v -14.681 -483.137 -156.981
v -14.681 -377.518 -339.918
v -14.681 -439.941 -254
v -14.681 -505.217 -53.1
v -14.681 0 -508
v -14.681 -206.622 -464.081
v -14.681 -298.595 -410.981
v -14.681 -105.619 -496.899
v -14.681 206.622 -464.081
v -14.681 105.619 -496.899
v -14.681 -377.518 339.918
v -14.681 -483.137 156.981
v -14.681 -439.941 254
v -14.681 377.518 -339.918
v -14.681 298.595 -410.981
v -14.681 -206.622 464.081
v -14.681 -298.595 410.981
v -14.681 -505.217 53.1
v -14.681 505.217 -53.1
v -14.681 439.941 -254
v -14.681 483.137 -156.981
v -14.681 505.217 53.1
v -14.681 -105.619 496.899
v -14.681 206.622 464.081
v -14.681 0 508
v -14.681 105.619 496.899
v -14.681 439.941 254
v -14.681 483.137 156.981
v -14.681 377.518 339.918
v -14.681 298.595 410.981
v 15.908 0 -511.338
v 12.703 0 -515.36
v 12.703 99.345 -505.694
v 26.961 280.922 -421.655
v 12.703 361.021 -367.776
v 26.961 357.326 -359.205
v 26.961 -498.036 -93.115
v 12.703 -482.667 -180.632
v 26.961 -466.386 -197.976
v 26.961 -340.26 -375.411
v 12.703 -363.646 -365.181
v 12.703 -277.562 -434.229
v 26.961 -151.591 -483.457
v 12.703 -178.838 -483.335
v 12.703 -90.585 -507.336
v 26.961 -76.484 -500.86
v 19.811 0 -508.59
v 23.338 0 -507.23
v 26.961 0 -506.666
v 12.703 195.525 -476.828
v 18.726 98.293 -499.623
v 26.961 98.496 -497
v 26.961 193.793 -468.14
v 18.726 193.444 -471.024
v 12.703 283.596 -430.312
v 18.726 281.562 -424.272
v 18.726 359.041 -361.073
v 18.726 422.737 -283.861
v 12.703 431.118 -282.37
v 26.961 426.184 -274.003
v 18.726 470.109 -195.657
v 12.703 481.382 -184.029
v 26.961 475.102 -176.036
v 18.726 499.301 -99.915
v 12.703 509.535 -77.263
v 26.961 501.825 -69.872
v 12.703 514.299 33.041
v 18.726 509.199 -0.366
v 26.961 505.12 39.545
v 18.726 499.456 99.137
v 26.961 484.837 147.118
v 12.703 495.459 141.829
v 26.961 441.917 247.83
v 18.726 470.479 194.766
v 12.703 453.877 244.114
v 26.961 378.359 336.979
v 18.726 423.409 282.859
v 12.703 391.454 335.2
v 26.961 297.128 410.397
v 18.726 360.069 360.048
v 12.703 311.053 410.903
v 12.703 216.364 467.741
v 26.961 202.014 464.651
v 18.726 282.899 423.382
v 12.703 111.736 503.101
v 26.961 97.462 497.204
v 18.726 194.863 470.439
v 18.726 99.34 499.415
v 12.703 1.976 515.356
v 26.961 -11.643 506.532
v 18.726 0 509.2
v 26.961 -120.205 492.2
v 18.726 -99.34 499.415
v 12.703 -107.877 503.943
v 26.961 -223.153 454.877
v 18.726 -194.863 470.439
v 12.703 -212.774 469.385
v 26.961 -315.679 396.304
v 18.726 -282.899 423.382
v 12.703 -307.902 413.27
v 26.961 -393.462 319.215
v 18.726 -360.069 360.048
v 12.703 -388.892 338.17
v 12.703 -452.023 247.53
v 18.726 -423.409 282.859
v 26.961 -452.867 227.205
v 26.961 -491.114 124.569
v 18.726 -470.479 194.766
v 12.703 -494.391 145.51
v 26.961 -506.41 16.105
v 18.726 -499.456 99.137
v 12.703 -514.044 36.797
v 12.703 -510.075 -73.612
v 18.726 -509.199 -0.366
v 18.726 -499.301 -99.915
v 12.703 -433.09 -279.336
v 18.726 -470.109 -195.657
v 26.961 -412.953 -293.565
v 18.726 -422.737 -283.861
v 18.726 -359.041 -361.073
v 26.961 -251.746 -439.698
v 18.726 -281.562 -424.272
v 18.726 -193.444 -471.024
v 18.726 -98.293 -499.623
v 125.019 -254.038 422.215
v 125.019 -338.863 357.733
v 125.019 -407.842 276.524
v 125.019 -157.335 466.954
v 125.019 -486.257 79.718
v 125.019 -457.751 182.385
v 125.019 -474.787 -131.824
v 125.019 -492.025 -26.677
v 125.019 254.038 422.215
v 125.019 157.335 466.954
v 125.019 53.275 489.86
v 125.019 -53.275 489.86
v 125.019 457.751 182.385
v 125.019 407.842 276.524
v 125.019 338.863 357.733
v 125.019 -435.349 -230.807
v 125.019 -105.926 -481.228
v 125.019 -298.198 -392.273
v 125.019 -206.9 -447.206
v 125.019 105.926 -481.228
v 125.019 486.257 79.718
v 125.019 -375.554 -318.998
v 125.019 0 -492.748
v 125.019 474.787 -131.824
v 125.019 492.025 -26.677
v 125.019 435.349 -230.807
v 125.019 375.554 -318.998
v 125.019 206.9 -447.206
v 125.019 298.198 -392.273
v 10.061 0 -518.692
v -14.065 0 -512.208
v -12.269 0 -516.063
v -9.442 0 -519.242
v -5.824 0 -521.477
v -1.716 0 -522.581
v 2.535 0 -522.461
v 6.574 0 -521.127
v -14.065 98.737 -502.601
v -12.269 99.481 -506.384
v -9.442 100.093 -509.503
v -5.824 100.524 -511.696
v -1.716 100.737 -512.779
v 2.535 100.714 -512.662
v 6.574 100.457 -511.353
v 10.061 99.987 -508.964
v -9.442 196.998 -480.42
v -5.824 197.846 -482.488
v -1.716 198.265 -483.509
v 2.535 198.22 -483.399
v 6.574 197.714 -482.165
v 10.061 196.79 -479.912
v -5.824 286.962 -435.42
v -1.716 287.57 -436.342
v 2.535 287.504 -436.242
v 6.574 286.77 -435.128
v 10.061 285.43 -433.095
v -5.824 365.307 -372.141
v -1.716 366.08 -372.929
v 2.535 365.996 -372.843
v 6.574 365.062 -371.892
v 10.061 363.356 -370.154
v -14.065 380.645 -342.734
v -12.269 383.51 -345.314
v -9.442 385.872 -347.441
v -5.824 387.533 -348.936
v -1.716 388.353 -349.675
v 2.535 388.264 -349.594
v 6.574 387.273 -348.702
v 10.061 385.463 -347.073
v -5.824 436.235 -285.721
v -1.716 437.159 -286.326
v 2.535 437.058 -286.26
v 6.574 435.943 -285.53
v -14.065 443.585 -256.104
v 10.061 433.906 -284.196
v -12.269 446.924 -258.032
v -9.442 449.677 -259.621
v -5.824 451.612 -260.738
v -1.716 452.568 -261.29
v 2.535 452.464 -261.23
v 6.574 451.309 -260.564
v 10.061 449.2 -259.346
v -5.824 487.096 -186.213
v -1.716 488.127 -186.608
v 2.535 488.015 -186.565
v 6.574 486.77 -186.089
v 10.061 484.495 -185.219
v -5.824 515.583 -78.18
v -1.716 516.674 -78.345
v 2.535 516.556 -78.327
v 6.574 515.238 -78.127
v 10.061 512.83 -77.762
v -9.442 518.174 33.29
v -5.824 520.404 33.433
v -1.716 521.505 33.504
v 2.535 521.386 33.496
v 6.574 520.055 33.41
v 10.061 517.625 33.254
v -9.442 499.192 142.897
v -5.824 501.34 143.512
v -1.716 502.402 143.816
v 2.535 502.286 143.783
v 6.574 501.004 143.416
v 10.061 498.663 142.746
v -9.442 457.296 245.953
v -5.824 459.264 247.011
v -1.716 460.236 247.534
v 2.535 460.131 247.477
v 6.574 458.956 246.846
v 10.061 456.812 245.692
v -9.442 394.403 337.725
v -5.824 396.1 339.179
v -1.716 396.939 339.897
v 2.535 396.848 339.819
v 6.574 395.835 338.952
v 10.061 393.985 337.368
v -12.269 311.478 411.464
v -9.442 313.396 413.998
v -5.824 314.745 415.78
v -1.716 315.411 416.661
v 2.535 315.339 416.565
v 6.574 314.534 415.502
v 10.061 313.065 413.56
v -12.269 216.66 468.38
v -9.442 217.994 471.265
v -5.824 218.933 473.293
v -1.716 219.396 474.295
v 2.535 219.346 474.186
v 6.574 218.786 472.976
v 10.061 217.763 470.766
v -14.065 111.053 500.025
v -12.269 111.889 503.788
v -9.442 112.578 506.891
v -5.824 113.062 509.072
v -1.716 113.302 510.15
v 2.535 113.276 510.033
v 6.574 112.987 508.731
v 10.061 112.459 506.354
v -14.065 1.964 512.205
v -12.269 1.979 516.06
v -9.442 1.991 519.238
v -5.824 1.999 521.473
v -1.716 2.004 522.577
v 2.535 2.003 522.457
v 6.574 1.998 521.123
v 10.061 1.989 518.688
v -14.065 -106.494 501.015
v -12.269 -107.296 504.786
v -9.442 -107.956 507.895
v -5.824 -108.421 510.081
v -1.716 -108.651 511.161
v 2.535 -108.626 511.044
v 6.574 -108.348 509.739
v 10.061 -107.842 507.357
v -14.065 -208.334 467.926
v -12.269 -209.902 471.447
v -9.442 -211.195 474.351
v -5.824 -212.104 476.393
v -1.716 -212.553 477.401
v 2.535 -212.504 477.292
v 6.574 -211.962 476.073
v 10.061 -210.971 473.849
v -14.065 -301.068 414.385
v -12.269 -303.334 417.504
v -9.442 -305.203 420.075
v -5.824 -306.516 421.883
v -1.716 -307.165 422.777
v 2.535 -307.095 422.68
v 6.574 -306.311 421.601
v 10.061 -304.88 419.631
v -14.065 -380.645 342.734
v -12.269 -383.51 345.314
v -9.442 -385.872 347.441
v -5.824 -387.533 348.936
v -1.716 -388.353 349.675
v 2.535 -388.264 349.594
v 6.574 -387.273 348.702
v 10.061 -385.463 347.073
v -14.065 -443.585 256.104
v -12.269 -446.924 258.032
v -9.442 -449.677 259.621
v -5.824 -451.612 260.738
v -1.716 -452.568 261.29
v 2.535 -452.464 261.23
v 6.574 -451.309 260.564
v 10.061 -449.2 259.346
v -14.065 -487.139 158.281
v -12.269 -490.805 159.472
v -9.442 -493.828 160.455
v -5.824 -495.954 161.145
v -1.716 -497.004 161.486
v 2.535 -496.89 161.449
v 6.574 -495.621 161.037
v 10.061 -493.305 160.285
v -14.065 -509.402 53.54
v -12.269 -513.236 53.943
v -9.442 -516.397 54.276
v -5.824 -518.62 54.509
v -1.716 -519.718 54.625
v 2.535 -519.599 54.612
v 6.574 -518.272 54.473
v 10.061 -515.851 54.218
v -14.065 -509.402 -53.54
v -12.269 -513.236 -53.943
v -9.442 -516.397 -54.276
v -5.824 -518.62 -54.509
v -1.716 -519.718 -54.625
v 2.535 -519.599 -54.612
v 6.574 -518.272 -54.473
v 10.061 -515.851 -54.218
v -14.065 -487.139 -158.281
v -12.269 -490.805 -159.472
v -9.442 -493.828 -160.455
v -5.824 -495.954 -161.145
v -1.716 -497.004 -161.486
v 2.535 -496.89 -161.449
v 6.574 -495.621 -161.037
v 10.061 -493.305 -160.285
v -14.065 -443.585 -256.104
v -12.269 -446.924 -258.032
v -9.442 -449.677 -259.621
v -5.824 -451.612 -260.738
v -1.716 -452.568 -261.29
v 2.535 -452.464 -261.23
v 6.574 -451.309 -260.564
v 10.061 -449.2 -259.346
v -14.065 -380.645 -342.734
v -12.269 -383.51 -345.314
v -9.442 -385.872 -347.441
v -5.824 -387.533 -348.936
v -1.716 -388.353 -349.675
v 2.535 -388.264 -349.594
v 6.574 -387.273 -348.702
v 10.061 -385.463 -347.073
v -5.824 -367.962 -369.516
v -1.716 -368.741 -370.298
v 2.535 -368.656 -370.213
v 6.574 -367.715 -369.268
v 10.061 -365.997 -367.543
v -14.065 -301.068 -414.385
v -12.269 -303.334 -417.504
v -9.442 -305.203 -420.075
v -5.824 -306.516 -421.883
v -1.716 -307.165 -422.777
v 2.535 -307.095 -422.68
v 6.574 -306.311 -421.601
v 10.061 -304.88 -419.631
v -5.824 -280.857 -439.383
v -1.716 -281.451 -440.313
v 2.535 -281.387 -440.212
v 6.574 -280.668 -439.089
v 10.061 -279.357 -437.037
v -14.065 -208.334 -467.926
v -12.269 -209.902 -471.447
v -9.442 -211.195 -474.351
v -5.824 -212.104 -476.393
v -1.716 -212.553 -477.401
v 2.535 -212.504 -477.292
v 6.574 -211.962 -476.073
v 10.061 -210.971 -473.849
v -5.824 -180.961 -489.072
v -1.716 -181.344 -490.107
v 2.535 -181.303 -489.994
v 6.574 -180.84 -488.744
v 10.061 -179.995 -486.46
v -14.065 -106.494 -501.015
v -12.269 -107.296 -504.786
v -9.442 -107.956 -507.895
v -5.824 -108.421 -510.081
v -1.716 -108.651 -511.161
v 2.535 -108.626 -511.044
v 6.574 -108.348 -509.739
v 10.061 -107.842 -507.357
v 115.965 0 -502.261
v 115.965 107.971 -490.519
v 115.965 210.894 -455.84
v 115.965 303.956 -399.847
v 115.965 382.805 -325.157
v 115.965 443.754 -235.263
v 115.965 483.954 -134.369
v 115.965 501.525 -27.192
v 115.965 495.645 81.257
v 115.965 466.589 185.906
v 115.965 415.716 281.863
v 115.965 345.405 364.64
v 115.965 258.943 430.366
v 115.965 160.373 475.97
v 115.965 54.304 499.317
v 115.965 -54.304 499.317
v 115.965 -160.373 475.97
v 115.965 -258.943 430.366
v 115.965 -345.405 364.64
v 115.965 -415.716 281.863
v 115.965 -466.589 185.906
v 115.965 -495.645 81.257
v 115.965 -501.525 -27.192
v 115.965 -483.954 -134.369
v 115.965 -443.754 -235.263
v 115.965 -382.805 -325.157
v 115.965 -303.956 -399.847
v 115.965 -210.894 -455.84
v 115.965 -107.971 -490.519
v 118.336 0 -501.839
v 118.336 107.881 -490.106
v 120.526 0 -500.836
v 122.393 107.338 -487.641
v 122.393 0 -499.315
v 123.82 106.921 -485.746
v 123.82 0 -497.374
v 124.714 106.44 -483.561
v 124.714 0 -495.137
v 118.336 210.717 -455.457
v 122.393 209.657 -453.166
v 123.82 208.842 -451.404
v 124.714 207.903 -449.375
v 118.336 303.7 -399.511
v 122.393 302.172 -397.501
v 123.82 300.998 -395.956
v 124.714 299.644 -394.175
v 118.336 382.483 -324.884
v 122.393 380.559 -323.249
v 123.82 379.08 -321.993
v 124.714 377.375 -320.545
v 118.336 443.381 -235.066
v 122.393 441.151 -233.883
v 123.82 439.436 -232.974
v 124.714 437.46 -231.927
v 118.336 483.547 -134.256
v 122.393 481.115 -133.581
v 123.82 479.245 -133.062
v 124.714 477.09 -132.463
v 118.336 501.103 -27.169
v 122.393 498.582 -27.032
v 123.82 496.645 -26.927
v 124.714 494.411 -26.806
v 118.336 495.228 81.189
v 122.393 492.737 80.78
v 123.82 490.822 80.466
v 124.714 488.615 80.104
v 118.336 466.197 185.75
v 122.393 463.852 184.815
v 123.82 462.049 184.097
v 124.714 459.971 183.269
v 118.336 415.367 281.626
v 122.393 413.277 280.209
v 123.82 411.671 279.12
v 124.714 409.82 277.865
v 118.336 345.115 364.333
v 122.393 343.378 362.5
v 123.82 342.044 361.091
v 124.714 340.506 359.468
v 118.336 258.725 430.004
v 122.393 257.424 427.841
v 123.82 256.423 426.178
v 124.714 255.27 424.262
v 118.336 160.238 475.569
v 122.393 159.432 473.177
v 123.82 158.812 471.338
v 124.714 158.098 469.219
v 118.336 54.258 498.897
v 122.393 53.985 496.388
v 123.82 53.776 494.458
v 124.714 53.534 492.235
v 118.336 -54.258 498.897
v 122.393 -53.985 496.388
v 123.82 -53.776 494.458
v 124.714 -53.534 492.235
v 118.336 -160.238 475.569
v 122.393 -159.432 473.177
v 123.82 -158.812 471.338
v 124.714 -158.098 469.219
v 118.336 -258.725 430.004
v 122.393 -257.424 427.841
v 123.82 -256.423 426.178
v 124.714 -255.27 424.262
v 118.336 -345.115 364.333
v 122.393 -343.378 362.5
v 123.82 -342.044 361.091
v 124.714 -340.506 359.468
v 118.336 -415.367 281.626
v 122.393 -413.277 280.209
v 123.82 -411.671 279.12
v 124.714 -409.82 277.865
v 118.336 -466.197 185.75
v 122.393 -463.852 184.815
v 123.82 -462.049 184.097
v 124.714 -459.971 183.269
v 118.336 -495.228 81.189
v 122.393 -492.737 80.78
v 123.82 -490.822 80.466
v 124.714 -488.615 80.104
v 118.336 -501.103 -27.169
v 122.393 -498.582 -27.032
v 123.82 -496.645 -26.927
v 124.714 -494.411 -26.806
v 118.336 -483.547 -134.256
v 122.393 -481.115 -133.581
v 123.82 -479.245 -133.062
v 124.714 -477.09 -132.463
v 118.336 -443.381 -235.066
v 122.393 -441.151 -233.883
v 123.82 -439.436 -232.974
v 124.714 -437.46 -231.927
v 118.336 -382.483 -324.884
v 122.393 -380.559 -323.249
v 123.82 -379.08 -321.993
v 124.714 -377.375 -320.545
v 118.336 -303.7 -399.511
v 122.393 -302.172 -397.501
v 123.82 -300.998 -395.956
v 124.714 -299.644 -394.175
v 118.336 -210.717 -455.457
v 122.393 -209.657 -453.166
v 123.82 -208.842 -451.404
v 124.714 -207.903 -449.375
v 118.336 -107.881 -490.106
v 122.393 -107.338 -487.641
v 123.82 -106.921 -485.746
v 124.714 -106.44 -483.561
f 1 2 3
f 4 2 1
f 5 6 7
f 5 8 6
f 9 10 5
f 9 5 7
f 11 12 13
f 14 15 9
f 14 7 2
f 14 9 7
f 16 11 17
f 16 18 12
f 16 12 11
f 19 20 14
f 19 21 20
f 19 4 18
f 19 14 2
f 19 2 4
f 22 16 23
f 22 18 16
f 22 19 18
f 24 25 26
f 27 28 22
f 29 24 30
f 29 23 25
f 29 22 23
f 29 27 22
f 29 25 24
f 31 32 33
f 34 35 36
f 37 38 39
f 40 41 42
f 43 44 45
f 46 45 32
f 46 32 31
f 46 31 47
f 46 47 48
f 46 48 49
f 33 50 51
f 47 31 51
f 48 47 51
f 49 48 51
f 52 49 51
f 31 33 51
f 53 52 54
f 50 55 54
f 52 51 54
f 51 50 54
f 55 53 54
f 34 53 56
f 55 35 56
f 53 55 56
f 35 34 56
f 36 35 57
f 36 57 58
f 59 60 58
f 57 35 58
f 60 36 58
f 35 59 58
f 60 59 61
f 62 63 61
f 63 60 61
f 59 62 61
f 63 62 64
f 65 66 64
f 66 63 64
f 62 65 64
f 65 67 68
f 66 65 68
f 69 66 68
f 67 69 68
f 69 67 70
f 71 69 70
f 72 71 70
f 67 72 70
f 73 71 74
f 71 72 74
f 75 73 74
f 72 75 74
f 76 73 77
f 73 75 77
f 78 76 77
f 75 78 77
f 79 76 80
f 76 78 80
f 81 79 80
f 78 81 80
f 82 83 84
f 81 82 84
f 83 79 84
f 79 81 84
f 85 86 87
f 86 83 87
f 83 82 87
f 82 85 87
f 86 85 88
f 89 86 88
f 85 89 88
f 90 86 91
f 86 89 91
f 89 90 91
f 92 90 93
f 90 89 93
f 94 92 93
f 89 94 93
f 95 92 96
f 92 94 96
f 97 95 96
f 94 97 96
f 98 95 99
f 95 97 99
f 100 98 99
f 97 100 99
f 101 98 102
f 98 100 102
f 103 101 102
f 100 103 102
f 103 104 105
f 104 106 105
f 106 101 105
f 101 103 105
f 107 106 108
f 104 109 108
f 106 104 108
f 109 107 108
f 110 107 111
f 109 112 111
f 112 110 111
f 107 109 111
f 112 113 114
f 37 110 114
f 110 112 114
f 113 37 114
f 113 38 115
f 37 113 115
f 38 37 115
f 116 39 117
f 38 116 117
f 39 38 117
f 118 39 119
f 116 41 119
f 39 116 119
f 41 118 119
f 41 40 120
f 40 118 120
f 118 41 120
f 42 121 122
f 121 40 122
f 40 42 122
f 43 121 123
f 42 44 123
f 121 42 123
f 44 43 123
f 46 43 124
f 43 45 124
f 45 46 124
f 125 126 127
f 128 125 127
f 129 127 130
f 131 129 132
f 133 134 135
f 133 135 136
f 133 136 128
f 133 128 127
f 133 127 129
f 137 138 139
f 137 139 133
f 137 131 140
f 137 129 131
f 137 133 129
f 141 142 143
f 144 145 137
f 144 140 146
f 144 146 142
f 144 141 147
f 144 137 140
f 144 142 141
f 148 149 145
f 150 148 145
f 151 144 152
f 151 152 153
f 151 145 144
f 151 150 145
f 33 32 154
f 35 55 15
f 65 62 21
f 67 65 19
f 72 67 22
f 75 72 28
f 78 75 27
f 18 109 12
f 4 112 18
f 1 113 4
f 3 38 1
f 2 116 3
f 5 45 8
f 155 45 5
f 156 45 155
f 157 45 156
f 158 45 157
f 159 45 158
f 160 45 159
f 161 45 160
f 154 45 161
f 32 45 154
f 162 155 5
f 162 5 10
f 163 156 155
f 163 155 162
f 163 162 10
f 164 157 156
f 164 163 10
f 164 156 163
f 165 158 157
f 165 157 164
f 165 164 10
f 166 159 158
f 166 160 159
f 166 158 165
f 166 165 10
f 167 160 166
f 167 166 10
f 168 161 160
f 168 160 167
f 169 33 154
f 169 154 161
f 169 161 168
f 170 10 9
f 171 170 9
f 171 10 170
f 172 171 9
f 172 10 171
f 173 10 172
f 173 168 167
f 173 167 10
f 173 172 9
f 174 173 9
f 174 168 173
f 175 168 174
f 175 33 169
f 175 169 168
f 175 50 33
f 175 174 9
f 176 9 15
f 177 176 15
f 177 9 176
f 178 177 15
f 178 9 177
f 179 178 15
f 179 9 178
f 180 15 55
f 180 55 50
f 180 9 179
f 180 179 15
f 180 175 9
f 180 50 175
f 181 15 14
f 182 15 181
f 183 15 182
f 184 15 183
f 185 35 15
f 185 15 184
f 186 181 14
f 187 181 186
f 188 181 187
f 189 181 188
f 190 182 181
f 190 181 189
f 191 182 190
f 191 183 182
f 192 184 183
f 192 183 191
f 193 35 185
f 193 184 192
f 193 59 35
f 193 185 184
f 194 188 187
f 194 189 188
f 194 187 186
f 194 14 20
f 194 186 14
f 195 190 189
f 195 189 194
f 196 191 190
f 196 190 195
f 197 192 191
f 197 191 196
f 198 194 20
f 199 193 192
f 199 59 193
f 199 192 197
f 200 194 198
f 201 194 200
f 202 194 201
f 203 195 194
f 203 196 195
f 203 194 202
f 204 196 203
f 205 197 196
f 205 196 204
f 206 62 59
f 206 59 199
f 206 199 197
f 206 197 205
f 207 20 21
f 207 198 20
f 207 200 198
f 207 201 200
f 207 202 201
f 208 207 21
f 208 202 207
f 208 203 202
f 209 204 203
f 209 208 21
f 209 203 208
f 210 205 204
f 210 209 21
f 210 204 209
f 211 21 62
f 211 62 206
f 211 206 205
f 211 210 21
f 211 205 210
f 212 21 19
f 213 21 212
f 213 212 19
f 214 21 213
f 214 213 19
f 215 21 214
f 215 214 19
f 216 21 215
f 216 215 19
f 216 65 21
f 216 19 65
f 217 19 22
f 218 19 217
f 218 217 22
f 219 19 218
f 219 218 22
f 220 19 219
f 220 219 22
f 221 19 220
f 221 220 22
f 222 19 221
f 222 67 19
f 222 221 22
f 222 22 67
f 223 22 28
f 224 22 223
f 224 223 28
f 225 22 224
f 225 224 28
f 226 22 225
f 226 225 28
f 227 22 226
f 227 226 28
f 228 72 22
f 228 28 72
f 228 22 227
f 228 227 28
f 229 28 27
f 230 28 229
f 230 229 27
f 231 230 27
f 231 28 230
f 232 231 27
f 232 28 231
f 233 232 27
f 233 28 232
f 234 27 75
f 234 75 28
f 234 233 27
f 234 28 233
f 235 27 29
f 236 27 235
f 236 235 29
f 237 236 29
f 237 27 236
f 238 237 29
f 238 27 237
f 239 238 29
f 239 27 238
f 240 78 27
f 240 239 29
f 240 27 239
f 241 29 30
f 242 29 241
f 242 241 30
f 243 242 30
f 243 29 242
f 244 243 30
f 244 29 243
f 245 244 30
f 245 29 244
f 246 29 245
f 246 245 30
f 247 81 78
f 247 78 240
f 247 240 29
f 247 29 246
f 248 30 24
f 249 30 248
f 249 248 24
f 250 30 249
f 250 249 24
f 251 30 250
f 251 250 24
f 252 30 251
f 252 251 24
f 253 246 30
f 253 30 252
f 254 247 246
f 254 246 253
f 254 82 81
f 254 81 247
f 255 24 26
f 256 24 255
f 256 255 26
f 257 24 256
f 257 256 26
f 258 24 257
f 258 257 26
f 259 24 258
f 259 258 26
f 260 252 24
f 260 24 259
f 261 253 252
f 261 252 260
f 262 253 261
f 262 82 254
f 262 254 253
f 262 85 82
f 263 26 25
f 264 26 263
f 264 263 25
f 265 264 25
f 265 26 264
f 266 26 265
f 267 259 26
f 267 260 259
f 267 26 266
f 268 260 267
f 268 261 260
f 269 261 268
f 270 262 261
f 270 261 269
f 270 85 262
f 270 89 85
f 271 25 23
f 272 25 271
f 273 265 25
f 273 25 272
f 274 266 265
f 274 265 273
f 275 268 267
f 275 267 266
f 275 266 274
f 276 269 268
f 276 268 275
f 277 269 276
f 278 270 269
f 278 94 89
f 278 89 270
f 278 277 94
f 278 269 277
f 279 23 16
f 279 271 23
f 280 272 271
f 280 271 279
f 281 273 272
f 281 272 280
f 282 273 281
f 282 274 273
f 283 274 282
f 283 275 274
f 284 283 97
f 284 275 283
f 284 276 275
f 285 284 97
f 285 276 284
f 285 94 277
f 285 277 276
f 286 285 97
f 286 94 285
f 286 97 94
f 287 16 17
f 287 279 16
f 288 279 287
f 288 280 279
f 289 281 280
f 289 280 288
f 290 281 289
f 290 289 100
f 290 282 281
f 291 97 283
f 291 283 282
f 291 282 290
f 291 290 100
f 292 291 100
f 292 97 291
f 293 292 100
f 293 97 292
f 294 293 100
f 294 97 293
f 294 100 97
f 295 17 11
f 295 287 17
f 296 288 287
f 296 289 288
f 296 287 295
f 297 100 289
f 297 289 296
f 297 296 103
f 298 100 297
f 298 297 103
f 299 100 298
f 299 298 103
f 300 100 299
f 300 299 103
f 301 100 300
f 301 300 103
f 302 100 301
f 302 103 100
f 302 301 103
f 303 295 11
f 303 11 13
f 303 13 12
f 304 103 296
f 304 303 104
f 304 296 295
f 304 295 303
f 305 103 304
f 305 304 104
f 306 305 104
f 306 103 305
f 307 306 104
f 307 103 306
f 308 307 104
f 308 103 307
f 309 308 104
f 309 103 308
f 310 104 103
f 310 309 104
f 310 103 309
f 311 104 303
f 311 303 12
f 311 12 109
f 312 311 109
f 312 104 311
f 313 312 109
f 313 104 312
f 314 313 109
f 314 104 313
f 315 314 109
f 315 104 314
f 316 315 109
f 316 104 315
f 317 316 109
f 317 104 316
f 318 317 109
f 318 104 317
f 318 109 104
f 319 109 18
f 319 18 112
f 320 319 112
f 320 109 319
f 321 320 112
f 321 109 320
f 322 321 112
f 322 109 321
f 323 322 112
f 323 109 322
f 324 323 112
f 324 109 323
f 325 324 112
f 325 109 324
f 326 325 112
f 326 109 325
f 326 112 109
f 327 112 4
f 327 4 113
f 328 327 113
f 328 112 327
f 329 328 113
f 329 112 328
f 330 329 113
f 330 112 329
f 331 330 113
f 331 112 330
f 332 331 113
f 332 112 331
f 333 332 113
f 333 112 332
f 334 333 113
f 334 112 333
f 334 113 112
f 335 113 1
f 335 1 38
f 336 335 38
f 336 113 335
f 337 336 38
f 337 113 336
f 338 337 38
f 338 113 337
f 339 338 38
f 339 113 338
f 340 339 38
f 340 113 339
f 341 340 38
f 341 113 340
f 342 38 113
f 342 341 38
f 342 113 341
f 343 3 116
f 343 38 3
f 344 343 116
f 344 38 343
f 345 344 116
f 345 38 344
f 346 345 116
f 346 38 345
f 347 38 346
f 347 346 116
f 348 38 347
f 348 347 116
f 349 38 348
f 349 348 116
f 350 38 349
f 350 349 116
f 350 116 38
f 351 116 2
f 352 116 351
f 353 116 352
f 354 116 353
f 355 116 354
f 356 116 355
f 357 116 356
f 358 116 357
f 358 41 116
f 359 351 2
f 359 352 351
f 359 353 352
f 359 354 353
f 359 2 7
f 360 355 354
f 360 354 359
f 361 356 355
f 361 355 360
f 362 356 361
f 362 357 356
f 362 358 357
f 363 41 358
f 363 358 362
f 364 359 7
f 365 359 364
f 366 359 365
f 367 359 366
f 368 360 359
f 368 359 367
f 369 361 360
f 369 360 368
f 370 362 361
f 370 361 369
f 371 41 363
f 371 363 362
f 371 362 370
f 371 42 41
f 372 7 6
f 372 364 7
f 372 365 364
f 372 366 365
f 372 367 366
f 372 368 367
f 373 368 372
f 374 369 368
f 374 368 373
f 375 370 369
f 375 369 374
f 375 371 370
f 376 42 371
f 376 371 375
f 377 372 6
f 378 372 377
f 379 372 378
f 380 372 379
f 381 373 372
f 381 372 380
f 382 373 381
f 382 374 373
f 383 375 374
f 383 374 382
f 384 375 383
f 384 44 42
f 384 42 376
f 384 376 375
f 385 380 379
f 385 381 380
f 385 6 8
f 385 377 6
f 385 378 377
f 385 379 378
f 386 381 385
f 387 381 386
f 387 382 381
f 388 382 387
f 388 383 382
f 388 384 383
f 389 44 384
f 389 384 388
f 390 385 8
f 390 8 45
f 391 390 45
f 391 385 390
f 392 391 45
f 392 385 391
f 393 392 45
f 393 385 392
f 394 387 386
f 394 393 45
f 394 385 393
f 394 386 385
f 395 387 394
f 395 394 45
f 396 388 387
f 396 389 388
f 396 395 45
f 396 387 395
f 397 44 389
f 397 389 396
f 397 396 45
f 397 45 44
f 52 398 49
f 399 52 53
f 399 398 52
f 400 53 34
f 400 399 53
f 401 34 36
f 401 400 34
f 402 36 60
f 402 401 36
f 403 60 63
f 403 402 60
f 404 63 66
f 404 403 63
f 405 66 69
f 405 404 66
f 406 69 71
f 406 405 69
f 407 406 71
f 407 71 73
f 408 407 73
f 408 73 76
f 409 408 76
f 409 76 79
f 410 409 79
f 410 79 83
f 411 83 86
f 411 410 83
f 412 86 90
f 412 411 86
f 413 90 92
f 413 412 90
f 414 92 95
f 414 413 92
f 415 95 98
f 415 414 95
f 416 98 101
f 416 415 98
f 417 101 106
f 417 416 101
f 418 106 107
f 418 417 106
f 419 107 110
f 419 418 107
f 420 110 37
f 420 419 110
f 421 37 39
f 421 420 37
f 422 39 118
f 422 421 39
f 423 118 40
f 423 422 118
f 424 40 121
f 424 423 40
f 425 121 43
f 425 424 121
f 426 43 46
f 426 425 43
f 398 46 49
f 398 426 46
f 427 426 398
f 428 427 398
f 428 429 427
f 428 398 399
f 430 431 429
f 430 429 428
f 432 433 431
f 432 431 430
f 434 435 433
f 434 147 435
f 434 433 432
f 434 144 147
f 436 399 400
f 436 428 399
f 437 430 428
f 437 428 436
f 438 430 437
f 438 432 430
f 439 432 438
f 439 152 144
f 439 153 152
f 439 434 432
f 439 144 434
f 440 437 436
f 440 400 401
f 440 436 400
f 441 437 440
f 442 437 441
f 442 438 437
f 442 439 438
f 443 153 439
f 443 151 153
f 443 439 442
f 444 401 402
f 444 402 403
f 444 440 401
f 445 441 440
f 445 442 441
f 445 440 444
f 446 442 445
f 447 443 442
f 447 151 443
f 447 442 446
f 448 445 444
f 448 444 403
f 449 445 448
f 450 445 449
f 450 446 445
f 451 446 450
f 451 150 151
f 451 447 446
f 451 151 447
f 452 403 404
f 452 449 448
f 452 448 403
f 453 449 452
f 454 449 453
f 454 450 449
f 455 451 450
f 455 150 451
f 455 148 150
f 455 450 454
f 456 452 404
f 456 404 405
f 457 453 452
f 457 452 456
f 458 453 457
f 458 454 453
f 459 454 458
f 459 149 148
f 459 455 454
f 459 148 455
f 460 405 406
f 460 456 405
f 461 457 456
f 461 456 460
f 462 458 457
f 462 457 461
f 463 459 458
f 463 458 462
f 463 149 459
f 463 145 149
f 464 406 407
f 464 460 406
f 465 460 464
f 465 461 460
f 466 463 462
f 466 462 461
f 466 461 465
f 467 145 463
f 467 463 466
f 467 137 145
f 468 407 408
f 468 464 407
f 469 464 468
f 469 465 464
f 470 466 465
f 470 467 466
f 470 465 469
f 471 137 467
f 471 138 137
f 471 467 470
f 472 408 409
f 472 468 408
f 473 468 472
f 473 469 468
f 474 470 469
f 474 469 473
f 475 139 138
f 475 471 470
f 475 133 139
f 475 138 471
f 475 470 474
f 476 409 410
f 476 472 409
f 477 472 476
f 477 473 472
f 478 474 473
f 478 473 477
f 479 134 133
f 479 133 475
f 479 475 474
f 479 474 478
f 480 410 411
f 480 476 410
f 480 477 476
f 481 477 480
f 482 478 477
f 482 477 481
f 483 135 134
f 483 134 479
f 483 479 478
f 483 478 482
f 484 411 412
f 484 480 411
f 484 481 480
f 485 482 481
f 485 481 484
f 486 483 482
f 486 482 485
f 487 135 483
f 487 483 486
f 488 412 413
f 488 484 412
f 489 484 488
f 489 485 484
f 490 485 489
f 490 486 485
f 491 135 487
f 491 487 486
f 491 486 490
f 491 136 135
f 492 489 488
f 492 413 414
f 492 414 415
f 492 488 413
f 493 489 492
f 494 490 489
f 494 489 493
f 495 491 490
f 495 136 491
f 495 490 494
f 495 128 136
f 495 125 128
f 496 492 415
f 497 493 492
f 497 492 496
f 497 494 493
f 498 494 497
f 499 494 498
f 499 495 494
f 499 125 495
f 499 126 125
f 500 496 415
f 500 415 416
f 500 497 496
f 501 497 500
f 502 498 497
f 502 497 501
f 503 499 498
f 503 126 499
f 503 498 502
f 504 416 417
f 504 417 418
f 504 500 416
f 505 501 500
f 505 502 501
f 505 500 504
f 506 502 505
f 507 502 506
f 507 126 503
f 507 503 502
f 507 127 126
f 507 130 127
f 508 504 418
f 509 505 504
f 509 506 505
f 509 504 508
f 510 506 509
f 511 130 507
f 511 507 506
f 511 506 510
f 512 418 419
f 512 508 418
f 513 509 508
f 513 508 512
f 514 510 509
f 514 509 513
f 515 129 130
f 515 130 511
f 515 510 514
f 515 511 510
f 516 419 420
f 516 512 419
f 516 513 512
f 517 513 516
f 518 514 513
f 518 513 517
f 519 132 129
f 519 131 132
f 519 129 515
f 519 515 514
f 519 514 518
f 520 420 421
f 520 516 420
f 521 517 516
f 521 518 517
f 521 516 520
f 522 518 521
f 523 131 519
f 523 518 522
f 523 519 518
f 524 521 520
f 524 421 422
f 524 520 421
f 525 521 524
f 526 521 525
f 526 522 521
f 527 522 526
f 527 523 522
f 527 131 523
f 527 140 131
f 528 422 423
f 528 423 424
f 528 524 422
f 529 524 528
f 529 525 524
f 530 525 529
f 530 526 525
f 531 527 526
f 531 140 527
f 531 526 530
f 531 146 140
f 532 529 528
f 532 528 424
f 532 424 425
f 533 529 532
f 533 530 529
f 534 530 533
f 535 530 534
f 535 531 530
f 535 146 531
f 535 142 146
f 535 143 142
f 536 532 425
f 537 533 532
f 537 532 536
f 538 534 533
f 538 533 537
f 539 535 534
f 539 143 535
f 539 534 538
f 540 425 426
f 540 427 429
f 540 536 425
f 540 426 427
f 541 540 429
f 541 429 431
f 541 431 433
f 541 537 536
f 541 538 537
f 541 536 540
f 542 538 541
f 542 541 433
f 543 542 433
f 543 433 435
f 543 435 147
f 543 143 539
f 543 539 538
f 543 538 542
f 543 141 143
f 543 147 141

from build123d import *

# Parameters (mm, degrees)
F2_R = 17.4752
F3_R = 9.525


with BuildPart() as f1:
    # F0 (on Front) → F1 (revolve)
    with BuildSketch(Plane.XZ):
        with BuildLine():
            ThreePointArc((14.663257, -507.274381), (-0.36292, -493.323286), (-14.6812, -508))
            ThreePointArc((-14.6812, -508), (0, -522.6812), (14.6812, -508))
            ThreePointArc((14.6812, -508), (14.676714, -507.63708), (14.663257, -507.274381))
        make_face()
        with BuildLine():
            Line((-14.6812, 0), (-14.6812, -508))
            ThreePointArc((-14.6812, -508), (-0.36292, -493.323286), (14.663257, -507.274381))
            Line((14.663257, -507.274381), (125.0188, -501.813381))
            Line((125.0188, -501.813381), (125.0188, 0))
            Line((125.0188, 0), (-14.6812, 0))
        make_face()
    revolve(axis=Axis((55.1688, 0, 0), (1, 0, 0)))

    # F2
    f2_edges = [f1.edges().sort_by_distance(p)[0] for p in [
        (14.663257, 0, 507.274381),
    ]]
    fillet(f2_edges, radius=F2_R)

    # F3
    f3_edges = [f1.edges().sort_by_distance(p)[0] for p in [
        (125.0188, 0, 501.813381),
    ]]
    fillet(f3_edges, radius=F3_R)


solid = f1.part
